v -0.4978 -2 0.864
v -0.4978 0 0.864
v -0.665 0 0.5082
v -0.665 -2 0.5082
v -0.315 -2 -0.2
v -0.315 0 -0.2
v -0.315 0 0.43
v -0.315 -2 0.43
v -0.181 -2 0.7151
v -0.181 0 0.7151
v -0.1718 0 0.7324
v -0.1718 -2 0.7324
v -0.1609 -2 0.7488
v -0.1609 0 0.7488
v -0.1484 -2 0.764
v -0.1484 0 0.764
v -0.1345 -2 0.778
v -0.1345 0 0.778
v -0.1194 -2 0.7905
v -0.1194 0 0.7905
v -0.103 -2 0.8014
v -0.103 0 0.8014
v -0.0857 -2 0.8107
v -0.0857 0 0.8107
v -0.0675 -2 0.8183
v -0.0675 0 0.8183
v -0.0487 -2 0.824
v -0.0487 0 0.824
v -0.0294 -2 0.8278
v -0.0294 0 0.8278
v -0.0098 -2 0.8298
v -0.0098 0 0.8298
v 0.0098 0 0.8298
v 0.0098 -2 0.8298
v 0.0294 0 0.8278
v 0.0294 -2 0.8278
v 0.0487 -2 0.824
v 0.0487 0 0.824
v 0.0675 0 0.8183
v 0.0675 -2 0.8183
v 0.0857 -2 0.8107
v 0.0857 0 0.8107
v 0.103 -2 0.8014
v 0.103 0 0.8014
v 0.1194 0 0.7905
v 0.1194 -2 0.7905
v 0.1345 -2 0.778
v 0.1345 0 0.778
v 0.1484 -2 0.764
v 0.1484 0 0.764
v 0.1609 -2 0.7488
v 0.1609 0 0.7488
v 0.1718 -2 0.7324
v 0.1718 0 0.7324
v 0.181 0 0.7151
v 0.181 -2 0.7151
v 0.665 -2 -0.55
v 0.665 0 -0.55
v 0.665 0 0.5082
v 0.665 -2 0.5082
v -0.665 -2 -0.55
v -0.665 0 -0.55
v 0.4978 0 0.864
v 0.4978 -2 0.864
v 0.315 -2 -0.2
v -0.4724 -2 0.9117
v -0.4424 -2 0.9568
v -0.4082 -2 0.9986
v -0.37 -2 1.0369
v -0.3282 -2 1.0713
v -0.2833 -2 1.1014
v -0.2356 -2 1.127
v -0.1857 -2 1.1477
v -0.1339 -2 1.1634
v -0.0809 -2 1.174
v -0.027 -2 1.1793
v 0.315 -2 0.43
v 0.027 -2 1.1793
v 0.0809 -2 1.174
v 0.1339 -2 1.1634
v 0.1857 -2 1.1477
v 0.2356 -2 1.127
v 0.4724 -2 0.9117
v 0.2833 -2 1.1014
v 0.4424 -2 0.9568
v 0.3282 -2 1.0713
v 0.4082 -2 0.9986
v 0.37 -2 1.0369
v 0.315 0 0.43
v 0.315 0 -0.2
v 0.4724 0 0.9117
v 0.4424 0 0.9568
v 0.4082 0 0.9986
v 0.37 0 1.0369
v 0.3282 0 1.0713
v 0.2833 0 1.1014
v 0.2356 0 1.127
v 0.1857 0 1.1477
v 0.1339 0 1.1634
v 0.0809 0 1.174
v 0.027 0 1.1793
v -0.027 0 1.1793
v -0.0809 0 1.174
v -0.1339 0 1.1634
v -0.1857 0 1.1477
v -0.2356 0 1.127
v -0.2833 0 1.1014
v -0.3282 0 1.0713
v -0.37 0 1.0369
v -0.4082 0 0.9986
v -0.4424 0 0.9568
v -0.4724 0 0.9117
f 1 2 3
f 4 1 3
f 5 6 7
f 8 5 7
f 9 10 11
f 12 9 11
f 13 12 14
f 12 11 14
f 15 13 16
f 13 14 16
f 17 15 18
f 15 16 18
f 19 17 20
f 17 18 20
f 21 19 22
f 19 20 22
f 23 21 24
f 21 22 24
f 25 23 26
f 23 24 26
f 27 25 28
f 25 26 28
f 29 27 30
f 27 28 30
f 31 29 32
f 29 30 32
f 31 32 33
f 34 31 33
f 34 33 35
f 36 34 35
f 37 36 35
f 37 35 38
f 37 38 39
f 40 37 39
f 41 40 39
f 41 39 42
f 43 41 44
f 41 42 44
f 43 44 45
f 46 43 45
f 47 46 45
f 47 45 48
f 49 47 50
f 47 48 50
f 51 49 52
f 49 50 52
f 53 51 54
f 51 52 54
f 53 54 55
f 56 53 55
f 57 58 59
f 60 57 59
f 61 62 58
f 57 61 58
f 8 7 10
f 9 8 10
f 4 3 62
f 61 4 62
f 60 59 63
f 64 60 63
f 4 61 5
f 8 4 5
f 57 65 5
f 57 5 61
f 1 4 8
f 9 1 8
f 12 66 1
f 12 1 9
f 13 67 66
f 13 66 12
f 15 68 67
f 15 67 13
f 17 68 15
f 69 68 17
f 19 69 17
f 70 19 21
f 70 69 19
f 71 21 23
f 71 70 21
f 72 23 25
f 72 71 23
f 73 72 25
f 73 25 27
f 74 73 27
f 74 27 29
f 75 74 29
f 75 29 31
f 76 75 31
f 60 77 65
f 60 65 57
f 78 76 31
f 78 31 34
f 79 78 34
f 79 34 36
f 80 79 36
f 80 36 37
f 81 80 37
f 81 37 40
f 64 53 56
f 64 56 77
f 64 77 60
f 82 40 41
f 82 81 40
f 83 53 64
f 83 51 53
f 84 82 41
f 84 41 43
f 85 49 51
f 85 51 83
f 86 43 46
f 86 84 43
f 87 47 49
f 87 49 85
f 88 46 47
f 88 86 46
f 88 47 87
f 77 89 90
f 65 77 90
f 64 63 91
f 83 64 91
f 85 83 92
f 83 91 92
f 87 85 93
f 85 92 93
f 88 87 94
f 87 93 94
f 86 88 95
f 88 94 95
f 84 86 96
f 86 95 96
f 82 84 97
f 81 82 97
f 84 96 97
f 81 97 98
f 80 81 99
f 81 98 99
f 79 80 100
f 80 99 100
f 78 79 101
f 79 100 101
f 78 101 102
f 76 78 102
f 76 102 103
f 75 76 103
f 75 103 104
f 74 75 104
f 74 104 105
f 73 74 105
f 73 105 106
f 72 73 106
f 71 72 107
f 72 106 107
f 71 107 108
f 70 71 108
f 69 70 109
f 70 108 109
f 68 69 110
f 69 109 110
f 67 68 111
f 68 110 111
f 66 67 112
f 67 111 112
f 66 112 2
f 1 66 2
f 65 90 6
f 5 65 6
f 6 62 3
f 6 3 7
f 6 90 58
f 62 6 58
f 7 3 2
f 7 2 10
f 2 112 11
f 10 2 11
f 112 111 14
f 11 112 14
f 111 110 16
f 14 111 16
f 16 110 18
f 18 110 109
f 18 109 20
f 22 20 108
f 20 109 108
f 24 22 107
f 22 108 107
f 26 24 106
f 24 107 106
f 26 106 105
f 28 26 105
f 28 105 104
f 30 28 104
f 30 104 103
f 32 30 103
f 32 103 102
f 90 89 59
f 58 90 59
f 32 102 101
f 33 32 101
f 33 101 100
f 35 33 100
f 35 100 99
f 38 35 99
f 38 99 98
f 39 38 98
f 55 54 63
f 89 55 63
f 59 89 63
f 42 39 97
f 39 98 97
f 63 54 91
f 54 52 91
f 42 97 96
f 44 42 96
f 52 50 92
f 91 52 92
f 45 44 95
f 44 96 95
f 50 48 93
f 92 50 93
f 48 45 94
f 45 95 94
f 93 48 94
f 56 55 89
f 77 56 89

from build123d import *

# Parameters (mm, degrees)
F1_DEPTH = 2


with BuildPart() as f1:
    # F0 (on Front) → F1 (new body)
    with BuildSketch(Plane.XZ):
        with BuildLine():
            Line((-0.665, 0.508155), (-0.665, -0.55))
            Line((-0.665, -0.55), (0.665, -0.55))
            Line((0.665, -0.55), (0.665, 0.508155))
            Line((0.665, 0.508155), (0.497755, 0.863965))
            ThreePointArc((0.497755, 0.863965), (0, 1.18), (-0.497755, 0.863965))
            Line((-0.497755, 0.863965), (-0.665, 0.508155))
        make_face()
        with BuildLine():
            Line((0.315, -0.2), (-0.315, -0.2))
            Line((-0.315, -0.2), (-0.315, 0.43))
            Line((-0.315, 0.43), (-0.181002, 0.715078))
            ThreePointArc((-0.181002, 0.715078), (0, 0.83), (0.181002, 0.715078))
            Line((0.181002, 0.715078), (0.315, 0.43))
            Line((0.315, 0.43), (0.315, -0.2))
        make_face(mode=Mode.SUBTRACT)
    extrude(amount=F1_DEPTH)


solid = f1.part
